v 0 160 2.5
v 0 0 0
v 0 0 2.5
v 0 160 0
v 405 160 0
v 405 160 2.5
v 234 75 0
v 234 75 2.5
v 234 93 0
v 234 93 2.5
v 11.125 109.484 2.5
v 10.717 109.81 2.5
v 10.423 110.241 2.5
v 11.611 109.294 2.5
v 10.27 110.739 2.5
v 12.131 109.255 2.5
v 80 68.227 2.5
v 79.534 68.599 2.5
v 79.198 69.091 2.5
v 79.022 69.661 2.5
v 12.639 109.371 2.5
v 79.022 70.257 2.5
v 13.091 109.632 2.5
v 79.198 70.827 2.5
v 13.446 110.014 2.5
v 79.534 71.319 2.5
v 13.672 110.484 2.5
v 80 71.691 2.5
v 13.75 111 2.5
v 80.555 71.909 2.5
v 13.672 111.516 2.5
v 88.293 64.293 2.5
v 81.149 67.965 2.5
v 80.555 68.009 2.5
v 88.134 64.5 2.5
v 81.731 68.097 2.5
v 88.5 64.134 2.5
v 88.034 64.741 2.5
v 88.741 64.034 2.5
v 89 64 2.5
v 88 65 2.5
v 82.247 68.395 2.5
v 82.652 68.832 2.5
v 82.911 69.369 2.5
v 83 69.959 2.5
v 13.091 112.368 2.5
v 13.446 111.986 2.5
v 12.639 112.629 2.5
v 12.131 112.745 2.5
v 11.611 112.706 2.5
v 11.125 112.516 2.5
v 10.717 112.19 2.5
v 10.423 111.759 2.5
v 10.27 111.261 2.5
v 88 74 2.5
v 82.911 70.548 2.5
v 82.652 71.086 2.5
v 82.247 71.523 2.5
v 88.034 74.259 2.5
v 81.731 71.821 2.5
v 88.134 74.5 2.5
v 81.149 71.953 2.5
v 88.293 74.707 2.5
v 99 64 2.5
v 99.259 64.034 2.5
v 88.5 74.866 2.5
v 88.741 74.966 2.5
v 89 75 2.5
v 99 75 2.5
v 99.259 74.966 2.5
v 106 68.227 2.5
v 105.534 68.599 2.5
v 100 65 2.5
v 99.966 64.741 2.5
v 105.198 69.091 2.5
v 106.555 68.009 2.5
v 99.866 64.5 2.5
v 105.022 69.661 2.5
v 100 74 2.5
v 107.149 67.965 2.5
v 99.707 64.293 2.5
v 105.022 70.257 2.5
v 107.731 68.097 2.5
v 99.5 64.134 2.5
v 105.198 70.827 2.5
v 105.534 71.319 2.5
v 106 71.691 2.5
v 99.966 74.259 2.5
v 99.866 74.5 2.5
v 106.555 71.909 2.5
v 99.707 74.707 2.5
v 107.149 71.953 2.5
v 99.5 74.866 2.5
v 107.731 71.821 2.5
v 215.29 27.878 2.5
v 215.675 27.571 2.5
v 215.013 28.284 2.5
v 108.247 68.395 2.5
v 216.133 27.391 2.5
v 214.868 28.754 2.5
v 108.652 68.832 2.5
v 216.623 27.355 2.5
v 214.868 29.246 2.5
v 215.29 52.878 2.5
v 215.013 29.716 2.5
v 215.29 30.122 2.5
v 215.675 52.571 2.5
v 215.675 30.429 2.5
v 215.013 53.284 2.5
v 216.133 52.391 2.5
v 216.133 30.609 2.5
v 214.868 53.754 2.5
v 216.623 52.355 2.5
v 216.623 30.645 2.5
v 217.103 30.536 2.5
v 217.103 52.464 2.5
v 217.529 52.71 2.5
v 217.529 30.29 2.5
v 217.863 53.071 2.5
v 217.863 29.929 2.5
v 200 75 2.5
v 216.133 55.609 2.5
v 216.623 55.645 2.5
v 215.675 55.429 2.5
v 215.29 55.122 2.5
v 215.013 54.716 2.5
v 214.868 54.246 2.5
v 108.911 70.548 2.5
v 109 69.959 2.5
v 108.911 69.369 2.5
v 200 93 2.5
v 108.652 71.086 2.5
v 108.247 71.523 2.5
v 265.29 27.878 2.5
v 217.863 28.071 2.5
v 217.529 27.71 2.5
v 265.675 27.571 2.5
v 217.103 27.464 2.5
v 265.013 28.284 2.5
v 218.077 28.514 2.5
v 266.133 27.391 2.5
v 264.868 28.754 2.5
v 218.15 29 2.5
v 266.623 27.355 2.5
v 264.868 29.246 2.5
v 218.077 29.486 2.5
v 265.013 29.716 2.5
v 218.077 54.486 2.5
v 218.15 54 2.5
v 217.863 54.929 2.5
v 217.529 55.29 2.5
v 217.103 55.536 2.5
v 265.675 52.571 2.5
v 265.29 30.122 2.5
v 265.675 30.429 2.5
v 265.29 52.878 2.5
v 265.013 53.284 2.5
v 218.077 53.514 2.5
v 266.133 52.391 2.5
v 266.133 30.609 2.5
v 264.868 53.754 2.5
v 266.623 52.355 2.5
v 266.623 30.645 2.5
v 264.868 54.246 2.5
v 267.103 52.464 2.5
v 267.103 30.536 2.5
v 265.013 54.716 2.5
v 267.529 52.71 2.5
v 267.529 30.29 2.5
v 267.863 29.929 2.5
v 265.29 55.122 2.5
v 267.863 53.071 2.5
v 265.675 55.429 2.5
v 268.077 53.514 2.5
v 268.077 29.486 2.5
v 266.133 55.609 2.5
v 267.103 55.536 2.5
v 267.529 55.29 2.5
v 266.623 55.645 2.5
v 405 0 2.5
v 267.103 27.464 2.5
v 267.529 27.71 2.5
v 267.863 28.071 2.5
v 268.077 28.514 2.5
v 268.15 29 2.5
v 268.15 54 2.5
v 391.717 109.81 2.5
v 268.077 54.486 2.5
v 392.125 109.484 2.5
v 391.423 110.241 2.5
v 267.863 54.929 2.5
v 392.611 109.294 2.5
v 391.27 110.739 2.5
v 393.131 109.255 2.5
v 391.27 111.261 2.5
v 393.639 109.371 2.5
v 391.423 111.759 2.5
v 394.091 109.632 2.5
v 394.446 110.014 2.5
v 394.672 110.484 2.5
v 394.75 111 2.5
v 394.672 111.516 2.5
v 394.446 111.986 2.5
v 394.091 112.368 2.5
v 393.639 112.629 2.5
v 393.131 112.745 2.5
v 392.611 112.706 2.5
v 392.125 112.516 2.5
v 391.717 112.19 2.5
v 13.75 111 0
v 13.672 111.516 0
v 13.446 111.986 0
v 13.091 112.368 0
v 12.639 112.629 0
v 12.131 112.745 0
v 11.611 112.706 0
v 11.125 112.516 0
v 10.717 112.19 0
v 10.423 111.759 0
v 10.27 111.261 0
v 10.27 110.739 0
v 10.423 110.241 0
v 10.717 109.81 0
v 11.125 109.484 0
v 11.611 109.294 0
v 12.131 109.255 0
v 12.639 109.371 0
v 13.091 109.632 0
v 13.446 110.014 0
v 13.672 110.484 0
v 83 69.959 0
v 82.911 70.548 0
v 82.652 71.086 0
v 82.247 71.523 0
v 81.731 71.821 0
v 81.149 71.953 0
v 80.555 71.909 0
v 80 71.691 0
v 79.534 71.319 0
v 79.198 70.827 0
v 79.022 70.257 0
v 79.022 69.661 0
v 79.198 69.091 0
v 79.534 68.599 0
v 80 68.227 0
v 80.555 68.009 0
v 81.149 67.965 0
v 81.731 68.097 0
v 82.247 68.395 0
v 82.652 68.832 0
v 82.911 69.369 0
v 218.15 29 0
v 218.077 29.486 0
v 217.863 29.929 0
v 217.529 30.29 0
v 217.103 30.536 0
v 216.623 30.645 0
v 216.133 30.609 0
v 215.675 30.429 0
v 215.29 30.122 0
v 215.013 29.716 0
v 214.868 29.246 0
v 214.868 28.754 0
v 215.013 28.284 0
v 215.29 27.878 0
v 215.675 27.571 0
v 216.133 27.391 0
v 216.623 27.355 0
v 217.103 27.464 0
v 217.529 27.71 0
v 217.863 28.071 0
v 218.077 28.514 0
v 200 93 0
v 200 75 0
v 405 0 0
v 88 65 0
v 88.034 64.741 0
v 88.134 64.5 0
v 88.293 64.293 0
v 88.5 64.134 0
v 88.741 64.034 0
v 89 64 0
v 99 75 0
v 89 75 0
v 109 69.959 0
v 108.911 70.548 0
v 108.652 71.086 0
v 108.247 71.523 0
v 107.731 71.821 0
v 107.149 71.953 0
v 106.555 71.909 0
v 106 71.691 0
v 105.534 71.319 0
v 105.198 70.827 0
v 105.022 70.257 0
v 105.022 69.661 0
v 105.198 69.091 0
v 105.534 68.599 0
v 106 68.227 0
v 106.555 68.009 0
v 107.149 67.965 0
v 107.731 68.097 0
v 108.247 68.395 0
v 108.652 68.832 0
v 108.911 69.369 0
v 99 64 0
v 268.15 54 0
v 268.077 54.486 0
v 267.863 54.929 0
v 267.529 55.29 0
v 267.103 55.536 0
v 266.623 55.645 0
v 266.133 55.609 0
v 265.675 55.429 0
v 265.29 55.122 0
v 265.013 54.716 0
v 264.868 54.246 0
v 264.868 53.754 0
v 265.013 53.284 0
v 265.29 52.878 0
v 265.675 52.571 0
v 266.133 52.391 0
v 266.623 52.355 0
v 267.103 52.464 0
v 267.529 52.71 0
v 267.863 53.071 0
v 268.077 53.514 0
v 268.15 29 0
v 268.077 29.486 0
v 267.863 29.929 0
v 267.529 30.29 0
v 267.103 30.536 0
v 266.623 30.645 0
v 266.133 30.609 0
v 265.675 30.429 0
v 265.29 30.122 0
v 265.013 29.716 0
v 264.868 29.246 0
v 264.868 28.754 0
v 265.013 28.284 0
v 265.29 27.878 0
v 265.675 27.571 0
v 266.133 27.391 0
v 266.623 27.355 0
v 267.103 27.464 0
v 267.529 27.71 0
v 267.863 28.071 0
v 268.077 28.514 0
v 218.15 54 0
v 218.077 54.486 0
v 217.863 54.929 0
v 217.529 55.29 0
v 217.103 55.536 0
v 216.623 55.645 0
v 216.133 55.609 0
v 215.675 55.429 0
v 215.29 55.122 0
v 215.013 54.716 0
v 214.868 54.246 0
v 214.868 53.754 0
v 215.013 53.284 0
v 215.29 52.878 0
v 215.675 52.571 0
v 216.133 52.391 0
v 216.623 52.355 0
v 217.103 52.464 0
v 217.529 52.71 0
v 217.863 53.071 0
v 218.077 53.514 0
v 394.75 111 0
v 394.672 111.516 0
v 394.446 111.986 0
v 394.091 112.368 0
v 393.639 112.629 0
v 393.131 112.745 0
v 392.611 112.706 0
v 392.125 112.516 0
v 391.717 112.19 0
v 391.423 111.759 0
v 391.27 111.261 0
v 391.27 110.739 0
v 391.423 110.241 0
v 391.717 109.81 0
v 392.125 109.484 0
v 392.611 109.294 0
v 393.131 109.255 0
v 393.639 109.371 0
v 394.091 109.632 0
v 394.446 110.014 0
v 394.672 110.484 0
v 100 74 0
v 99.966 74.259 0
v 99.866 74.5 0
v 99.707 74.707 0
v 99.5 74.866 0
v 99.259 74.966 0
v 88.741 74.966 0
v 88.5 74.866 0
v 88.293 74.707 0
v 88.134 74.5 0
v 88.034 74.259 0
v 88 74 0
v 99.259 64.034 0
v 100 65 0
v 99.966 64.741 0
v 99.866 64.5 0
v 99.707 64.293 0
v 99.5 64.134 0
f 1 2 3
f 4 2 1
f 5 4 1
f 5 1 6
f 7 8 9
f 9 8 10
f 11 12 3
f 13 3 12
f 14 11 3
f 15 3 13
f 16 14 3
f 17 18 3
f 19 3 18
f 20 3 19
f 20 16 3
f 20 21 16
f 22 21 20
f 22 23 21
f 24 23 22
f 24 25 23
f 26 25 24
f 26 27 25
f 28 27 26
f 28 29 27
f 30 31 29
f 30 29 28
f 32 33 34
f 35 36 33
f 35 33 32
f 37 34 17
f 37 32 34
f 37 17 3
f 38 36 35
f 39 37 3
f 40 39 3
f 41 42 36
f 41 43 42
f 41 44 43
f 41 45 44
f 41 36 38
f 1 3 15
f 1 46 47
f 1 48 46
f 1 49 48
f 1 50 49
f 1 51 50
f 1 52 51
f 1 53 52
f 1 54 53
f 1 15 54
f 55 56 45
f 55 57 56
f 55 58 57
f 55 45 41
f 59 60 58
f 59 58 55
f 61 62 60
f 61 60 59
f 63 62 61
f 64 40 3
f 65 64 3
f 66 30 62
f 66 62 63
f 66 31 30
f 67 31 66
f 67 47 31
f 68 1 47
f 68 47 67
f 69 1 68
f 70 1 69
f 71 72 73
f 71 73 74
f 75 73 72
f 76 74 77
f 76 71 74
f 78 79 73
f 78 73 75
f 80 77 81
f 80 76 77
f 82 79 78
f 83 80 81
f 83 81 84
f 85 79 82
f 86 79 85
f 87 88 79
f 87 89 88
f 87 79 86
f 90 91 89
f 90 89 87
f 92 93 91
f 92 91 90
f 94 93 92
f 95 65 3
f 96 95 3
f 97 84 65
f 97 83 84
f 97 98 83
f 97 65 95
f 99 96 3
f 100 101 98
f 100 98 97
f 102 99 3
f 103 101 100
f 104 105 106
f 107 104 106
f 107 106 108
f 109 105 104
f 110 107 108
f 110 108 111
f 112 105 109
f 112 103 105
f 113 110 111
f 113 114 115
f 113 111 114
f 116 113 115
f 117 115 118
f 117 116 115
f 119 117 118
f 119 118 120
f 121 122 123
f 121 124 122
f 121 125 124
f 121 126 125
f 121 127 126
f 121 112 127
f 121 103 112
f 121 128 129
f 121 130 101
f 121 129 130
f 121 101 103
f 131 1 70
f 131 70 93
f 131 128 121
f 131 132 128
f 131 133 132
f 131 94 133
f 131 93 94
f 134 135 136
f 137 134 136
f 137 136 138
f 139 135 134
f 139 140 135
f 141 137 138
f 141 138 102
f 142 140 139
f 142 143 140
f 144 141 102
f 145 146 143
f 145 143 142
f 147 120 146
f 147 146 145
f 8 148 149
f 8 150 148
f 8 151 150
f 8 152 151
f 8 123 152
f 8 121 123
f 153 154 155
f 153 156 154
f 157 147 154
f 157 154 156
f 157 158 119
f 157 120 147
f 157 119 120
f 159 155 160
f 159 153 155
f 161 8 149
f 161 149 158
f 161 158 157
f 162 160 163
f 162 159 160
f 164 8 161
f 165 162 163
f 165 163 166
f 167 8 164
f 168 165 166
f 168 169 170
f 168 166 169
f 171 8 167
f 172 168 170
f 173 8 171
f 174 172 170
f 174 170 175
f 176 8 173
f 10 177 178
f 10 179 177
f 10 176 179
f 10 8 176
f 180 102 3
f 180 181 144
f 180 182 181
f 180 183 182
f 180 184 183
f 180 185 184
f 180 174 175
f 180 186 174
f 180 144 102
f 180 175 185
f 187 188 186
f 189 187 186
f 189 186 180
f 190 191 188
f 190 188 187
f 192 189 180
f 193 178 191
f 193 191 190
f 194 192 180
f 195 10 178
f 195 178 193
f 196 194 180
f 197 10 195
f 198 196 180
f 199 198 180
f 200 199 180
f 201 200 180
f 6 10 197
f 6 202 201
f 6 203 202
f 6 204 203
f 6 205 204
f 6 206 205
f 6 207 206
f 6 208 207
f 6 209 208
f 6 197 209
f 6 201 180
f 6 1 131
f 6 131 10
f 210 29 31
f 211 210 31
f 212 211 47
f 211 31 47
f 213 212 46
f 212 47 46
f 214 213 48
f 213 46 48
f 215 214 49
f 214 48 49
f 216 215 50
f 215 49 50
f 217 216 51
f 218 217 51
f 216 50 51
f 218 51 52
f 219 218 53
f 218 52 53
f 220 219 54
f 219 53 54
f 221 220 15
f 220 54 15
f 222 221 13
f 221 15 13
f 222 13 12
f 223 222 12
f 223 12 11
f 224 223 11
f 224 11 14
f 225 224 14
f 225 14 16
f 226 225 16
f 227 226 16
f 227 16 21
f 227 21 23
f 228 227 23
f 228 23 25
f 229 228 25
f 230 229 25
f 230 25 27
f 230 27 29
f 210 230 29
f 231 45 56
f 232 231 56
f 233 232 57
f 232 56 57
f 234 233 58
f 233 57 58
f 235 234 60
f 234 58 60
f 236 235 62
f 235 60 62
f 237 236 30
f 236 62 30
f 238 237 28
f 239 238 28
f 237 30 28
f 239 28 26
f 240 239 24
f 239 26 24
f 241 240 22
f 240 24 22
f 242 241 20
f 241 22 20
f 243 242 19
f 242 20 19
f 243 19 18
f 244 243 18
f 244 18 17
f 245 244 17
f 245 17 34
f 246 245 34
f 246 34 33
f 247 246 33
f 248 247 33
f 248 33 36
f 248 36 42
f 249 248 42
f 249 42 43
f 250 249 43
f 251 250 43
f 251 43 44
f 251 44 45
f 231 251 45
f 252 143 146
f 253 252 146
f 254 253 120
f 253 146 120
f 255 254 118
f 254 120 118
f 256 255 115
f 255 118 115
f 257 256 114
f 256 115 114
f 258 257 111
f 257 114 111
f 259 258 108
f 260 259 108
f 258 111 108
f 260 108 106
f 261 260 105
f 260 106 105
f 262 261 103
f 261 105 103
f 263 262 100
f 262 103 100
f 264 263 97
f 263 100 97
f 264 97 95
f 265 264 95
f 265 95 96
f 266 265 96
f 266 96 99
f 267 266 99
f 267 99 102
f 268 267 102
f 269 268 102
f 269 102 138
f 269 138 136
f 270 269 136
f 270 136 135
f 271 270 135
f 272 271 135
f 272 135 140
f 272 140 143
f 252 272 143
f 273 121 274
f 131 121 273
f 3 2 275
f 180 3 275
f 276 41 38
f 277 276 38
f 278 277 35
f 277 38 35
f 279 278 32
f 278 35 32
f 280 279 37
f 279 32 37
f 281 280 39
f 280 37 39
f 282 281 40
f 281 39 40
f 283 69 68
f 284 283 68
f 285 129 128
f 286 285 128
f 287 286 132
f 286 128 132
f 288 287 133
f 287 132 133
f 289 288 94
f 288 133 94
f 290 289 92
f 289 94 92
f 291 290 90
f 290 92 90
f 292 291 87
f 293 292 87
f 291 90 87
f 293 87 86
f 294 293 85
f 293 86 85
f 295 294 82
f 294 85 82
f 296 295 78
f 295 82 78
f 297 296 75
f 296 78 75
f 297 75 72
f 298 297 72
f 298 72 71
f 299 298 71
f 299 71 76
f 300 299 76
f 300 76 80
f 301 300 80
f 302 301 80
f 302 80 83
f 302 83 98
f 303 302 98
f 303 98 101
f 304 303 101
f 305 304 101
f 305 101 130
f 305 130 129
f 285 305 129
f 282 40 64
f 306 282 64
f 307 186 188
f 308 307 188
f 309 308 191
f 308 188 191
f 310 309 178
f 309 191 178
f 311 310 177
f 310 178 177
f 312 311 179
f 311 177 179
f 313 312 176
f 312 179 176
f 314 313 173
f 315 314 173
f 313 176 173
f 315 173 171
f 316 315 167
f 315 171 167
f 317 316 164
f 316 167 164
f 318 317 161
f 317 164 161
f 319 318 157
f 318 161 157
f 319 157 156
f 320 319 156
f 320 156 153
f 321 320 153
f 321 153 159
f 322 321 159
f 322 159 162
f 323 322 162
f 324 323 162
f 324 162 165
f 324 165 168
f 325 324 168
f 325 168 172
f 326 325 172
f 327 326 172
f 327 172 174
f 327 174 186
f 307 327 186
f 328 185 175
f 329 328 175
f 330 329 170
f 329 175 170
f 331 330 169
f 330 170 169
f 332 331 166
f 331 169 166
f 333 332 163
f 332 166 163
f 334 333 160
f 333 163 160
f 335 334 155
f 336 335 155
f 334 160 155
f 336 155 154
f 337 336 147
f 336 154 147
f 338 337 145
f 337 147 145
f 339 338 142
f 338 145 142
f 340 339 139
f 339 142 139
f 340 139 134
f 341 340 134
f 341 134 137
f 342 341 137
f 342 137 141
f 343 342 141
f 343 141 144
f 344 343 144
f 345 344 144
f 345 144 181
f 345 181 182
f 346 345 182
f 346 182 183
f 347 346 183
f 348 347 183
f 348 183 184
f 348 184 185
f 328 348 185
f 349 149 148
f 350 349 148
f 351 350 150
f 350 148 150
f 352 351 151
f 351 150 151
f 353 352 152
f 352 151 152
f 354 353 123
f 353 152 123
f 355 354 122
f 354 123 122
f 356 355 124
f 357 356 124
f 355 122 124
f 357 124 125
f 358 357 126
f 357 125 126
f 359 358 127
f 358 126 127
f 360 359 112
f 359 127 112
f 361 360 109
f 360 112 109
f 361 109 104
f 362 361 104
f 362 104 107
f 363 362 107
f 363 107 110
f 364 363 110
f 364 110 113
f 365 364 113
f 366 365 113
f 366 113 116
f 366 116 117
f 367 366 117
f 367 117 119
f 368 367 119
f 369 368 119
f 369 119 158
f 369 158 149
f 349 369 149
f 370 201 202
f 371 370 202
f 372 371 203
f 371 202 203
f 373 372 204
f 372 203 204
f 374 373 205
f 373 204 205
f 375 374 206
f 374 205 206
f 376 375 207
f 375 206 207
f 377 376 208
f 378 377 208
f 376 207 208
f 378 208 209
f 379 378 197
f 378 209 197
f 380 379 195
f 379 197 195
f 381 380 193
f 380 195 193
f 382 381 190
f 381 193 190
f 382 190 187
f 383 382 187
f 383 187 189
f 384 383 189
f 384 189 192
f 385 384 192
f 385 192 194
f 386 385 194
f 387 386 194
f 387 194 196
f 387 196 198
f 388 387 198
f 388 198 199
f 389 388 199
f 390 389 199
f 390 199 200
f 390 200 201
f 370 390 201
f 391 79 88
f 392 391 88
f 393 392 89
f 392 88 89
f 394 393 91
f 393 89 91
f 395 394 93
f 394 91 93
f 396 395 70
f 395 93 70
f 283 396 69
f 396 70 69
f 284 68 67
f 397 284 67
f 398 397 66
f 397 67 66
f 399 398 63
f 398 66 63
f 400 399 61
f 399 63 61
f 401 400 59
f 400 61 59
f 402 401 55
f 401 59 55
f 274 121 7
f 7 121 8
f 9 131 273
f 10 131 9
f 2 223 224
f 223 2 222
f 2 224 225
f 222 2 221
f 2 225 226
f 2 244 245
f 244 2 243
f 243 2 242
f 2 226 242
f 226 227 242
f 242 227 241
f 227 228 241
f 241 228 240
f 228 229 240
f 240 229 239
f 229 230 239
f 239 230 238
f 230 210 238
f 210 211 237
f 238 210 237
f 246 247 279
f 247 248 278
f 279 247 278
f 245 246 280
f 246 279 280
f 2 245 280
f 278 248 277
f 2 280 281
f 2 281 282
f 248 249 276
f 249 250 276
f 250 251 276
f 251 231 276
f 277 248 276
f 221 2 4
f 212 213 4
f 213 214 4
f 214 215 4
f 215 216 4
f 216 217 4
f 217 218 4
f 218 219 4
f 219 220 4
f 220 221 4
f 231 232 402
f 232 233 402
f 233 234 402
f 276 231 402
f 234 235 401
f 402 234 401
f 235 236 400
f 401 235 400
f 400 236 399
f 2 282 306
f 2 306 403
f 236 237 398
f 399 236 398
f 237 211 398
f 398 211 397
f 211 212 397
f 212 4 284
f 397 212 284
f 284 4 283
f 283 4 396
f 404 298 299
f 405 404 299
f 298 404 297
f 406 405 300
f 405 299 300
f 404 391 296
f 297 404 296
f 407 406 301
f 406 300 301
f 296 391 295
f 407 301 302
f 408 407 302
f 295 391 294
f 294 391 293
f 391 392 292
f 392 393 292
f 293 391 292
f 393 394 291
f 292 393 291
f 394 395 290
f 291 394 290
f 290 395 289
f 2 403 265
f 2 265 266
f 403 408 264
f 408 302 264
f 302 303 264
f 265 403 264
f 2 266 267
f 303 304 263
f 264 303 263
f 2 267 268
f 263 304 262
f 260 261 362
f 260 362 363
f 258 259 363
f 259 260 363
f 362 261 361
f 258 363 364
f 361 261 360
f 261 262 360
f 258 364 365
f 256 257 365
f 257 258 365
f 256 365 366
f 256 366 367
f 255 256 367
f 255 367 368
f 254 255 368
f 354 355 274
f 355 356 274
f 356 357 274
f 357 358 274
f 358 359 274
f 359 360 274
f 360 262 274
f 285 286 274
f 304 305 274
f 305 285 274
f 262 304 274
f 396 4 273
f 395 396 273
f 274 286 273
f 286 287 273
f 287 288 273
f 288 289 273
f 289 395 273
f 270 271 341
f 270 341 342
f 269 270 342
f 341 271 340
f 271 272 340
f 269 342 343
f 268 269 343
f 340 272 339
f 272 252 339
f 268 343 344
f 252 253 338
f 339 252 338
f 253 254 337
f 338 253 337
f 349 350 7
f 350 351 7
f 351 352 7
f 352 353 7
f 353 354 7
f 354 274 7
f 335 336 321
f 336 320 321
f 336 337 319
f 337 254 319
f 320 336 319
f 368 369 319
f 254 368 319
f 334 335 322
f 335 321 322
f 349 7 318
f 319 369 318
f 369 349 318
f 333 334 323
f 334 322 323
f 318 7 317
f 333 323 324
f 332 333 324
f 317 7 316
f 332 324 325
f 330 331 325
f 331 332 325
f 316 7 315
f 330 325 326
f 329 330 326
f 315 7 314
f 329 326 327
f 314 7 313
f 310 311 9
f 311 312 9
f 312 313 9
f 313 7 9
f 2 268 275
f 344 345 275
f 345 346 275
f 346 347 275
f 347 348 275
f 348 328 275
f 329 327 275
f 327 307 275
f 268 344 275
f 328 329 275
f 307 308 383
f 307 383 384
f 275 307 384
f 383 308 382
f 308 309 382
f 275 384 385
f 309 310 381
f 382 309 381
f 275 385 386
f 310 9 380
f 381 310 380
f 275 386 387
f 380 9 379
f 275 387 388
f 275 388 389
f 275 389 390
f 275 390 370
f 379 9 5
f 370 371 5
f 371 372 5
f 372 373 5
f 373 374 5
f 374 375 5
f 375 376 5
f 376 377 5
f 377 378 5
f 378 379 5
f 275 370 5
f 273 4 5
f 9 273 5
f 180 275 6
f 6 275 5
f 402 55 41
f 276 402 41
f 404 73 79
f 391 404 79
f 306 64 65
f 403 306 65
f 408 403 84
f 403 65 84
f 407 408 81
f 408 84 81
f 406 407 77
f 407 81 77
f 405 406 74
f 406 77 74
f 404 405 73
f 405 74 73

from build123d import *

# Parameters (mm, degrees)
F0_W     = 405
F0_H     = 160
F1_DEPTH = 2.5
F3_R     = 2
F4_DEPTH = 25
F5_W     = 34
F5_H     = 18
F5_R     = 1.65
F6_DEPTH = 25
F2_R     = 1.75
F7_DEPTH = 25


with BuildPart() as f1:
    # F0 (on Top) → F1 (new body)
    with BuildSketch(Plane.XY):
        with Locations((202.5, 80)):
            Rectangle(F0_W, F0_H)
    extrude(amount=F1_DEPTH)

    # F3 (on face) → F4 (cut)
    with BuildSketch(Plane.XY.offset(2.5)):
        with BuildLine():
            Line((99, 75), (89, 75))
            ThreePointArc((89, 75), (88.292893, 74.707107), (88, 74))
            Line((88, 74), (88, 65))
            ThreePointArc((88, 65), (88.292893, 64.292893), (89, 64))
            Line((89, 64), (99, 64))
            ThreePointArc((99, 64), (99.707107, 64.292893), (100, 65))
            Line((100, 65), (100, 74))
            ThreePointArc((100, 74), (99.707107, 74.707107), (99, 75))
        make_face()
        with Locations((81, 69.958977)):
            Circle(F3_R)
        with Locations((107, 69.958977)):
            Circle(F3_R)
    extrude(amount=-F4_DEPTH, mode=Mode.SUBTRACT)

    # F5 (on face) → F6 (cut)
    with BuildSketch(Plane.XY.offset(2.5)):
        with Locations((217, 84)):
            Rectangle(F5_W, F5_H)
        with Locations((216.5, 54)):
            Circle(F5_R)
        with Locations((266.5, 54)):
            Circle(F5_R)
        with Locations((266.5, 29)):
            Circle(F5_R)
        with Locations((216.5, 29)):
            Circle(F5_R)
    extrude(amount=-F6_DEPTH, mode=Mode.SUBTRACT)

    # F2 (on face) → F7 (cut)
    with BuildSketch(Plane.XY.offset(2.5)):
        with Locations((12, 111)):
            Circle(F2_R)
        with Locations((393, 111)):
            Circle(F2_R)
    extrude(amount=-F7_DEPTH, mode=Mode.SUBTRACT)


solid = f1.part
